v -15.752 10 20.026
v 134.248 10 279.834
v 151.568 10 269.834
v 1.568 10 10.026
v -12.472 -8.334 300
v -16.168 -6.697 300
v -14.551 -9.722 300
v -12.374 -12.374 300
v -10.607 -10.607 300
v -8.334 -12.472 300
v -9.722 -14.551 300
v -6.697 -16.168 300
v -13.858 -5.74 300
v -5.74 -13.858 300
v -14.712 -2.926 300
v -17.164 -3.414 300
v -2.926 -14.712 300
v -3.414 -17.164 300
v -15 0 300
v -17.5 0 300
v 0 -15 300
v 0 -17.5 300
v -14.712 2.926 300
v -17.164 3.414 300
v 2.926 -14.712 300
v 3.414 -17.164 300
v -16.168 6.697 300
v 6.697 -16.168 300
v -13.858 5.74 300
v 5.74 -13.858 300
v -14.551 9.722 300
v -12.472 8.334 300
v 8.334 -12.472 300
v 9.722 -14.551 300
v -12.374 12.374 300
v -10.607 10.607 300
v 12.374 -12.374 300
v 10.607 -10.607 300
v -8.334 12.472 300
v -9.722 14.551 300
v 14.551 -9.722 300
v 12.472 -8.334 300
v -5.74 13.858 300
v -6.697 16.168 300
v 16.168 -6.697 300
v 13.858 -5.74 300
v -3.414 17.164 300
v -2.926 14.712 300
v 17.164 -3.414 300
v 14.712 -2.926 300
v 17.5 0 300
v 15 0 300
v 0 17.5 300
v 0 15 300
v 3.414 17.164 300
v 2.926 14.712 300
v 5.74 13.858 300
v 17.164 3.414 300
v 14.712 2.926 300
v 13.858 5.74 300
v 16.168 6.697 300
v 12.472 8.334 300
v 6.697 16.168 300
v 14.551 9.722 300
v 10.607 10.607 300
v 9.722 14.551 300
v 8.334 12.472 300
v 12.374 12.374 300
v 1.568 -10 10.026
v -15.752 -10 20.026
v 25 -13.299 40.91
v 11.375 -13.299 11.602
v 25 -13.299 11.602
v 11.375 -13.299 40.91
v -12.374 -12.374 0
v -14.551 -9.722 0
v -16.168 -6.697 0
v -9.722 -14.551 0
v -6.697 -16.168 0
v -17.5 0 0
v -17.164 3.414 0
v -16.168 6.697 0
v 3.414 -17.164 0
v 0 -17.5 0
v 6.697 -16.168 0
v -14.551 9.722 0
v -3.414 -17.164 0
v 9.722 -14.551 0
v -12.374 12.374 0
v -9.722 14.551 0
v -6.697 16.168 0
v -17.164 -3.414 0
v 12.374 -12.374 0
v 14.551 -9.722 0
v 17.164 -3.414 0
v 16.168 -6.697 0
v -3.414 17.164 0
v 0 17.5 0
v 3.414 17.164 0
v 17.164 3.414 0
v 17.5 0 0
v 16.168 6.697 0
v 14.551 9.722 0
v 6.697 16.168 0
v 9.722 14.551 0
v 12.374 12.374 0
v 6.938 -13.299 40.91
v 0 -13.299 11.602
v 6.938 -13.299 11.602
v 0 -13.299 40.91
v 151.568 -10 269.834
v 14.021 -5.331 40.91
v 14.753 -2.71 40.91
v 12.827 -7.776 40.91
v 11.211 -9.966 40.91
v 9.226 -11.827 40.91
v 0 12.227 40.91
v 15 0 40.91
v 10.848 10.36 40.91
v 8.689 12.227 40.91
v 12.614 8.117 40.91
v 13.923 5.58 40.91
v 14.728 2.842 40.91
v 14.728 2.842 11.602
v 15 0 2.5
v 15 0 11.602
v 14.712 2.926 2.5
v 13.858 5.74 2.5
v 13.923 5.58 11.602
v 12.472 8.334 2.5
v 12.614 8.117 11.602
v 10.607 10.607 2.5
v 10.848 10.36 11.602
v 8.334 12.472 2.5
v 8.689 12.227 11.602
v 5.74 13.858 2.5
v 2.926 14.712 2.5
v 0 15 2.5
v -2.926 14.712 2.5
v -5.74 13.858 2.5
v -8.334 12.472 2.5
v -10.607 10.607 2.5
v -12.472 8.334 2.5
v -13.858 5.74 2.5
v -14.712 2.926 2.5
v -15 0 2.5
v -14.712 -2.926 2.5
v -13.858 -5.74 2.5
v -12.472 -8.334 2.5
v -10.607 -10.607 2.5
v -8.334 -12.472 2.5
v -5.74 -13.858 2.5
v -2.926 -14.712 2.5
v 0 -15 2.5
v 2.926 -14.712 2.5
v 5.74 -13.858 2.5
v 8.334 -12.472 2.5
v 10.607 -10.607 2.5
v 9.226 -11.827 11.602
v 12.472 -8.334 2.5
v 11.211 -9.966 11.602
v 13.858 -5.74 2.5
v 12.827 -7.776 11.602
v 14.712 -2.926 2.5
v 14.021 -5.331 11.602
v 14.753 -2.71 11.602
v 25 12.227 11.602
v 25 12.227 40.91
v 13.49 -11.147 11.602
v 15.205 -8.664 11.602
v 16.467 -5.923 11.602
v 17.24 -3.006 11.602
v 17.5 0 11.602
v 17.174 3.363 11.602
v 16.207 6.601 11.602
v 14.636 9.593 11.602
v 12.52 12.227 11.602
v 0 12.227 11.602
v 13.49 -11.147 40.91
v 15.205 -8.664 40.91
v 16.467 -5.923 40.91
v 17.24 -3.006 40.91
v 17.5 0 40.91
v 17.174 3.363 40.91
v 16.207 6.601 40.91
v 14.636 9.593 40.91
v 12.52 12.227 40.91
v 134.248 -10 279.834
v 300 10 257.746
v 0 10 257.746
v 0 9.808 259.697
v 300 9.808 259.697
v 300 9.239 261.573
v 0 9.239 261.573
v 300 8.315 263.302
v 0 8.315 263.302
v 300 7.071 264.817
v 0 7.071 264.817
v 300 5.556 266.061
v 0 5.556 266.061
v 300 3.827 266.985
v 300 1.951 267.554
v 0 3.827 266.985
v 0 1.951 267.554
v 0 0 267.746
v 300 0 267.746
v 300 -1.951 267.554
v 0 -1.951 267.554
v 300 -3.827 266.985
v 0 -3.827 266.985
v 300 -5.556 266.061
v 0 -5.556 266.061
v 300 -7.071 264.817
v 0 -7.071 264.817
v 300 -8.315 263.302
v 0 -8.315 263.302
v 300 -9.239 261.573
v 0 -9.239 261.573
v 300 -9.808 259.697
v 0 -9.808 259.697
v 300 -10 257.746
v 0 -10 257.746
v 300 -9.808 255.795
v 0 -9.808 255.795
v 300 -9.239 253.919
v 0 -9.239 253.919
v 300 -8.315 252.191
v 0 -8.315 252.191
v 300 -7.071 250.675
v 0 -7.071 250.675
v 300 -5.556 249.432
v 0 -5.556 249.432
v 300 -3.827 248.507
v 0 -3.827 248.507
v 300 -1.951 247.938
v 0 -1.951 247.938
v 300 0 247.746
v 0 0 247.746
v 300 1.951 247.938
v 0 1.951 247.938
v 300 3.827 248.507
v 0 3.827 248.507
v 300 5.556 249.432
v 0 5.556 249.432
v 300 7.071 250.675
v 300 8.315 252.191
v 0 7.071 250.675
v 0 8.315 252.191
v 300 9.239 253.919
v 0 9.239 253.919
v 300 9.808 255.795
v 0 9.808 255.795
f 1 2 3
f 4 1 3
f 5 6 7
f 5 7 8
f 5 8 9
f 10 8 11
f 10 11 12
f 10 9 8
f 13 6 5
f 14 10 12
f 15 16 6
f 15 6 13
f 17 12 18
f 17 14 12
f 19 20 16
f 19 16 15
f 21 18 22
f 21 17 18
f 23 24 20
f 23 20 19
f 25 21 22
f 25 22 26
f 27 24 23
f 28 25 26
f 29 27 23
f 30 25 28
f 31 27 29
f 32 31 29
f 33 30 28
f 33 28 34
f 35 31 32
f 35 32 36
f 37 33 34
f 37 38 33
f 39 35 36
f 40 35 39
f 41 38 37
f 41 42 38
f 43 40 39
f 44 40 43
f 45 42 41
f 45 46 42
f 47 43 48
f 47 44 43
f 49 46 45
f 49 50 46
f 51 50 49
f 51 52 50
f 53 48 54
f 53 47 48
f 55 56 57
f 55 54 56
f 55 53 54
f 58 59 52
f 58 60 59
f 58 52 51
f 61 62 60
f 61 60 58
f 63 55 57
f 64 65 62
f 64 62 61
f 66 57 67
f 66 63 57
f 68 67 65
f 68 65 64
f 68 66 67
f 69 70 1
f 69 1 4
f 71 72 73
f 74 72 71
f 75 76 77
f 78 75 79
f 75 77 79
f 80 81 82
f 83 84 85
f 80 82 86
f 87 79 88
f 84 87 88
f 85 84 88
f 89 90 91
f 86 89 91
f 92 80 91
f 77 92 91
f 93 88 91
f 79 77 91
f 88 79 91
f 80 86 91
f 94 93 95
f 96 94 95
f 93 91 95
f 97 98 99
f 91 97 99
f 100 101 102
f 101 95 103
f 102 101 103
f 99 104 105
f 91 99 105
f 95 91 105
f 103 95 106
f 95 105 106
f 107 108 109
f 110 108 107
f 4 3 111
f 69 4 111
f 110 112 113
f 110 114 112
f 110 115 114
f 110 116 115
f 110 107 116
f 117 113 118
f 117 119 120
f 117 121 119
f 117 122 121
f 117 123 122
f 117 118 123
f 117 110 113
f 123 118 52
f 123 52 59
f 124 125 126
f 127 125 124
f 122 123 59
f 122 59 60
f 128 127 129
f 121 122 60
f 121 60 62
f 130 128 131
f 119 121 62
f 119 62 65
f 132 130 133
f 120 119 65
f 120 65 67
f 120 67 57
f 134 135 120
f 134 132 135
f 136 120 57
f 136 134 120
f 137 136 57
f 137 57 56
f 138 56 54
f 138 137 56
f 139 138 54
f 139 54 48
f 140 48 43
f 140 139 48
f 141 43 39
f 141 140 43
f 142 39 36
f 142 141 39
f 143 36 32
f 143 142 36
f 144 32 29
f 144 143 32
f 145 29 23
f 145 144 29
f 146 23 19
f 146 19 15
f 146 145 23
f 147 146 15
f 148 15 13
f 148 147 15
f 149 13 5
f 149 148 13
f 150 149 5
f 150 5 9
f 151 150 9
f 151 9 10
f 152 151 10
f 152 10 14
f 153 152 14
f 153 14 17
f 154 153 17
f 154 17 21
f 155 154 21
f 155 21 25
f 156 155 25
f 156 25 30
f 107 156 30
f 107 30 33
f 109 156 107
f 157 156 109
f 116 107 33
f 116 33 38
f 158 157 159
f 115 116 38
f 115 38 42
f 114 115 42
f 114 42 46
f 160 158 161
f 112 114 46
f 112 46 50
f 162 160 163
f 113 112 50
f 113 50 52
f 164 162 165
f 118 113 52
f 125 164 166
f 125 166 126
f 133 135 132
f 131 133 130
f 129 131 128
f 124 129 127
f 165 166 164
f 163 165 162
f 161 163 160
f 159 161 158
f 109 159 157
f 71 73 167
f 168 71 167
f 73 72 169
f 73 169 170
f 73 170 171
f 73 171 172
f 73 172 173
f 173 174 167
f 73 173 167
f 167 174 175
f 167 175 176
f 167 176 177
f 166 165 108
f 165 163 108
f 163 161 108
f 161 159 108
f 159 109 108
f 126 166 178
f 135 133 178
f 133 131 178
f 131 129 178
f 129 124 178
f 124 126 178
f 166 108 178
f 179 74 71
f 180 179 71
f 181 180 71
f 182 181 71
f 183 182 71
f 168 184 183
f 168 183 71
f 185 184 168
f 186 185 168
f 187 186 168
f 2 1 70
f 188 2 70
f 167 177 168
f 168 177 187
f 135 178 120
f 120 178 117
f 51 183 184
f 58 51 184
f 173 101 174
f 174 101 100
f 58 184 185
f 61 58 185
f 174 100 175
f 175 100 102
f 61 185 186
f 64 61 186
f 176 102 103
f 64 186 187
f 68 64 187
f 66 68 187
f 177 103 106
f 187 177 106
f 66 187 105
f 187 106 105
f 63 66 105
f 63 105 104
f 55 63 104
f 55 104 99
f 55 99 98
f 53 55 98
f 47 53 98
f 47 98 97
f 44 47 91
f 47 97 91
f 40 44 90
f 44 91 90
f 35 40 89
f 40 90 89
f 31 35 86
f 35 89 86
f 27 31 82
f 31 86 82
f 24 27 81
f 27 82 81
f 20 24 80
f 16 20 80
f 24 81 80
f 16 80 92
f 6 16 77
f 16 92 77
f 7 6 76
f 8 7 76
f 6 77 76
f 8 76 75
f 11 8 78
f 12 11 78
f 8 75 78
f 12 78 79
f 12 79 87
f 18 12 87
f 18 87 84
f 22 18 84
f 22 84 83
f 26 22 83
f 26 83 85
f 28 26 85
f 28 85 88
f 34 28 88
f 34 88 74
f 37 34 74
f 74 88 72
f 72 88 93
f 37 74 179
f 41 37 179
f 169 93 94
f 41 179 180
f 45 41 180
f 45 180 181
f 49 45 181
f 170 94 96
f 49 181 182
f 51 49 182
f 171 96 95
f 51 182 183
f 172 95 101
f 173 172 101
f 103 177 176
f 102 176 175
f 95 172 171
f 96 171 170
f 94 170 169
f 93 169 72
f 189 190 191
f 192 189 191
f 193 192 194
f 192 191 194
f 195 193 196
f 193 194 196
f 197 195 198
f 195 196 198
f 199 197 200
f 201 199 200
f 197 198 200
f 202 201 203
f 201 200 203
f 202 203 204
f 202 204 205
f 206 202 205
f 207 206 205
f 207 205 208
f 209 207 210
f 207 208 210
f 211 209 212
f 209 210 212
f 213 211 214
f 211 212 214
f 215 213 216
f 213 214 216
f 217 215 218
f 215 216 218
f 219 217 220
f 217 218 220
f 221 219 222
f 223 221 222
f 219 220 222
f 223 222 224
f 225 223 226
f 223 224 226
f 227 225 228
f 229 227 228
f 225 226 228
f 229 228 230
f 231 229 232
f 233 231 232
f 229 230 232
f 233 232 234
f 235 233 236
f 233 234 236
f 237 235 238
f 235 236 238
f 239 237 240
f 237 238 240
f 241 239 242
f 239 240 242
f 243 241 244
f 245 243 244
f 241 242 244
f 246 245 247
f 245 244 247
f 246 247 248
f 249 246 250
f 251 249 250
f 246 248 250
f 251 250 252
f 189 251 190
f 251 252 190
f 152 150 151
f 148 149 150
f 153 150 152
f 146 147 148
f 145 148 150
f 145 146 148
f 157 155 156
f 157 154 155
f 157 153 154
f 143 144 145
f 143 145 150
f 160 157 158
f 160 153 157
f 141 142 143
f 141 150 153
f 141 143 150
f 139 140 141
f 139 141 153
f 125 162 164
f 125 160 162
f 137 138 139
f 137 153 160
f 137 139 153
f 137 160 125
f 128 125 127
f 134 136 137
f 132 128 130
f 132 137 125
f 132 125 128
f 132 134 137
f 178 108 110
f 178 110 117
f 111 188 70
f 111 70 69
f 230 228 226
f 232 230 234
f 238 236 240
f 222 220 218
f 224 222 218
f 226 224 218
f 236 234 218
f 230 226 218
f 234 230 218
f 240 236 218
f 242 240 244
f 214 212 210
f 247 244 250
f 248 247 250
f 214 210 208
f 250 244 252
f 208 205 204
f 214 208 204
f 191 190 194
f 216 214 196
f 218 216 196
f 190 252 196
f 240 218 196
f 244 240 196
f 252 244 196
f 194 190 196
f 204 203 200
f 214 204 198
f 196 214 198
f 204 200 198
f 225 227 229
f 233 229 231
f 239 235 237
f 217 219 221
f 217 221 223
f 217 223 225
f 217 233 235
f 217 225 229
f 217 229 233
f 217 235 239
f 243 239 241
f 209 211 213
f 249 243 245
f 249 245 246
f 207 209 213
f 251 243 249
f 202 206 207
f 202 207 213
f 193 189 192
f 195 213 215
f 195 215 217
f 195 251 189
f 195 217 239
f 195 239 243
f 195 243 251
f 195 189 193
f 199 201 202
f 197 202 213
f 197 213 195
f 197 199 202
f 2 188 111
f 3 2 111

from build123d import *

# Parameters (mm, degrees)
F0_R      = 17.5
F1_DEPTH  = 300
F2_T      = -2.5
F3_R      = 10
F4_DEPTH  = 300
F5_W      = 25.526379
F5_H      = 29.308066
F7_DEPTH  = 25
F10_W     = 20
F10_H     = 20
F11_DEPTH = 300


with BuildPart() as f1:
    # F0 (on Top) → F1 (new body)
    with BuildSketch(Plane.XY):
        Circle(F0_R)
    extrude(amount=F1_DEPTH)

    # F2
    f2_openings = [f1.faces().sort_by_distance(p)[0] for p in [
        (0, 0, 300),
    ]]
    offset(amount=F2_T, openings=f2_openings)

    # F5 (on Right) → F7 (join)
    with BuildSketch(Plane.YZ):
        with Locations((-0.536079, 26.255716)):
            Rectangle(F5_W, F5_H)
    extrude(amount=F7_DEPTH)


with BuildPart() as f4:
    # F3 (on Right) → F4 (new body)
    with BuildSketch(Plane.YZ):
        with Locations((0, 257.74622)):
            Circle(F3_R)
    extrude(amount=F4_DEPTH)


with BuildPart() as f11:
    # F10 (on face) → F11 (new body)
    with BuildSketch(Plane(origin=(4.733381, 0, 8.198457), x_dir=(0.866025, 0, -0.5), z_dir=(-0.5, 0, -0.866025))):
        with Locations((-13.654941, 0)):
            Rectangle(F10_W, F10_H)
    extrude(amount=-F11_DEPTH)


solid = Compound([f1.part, f4.part, f11.part])
